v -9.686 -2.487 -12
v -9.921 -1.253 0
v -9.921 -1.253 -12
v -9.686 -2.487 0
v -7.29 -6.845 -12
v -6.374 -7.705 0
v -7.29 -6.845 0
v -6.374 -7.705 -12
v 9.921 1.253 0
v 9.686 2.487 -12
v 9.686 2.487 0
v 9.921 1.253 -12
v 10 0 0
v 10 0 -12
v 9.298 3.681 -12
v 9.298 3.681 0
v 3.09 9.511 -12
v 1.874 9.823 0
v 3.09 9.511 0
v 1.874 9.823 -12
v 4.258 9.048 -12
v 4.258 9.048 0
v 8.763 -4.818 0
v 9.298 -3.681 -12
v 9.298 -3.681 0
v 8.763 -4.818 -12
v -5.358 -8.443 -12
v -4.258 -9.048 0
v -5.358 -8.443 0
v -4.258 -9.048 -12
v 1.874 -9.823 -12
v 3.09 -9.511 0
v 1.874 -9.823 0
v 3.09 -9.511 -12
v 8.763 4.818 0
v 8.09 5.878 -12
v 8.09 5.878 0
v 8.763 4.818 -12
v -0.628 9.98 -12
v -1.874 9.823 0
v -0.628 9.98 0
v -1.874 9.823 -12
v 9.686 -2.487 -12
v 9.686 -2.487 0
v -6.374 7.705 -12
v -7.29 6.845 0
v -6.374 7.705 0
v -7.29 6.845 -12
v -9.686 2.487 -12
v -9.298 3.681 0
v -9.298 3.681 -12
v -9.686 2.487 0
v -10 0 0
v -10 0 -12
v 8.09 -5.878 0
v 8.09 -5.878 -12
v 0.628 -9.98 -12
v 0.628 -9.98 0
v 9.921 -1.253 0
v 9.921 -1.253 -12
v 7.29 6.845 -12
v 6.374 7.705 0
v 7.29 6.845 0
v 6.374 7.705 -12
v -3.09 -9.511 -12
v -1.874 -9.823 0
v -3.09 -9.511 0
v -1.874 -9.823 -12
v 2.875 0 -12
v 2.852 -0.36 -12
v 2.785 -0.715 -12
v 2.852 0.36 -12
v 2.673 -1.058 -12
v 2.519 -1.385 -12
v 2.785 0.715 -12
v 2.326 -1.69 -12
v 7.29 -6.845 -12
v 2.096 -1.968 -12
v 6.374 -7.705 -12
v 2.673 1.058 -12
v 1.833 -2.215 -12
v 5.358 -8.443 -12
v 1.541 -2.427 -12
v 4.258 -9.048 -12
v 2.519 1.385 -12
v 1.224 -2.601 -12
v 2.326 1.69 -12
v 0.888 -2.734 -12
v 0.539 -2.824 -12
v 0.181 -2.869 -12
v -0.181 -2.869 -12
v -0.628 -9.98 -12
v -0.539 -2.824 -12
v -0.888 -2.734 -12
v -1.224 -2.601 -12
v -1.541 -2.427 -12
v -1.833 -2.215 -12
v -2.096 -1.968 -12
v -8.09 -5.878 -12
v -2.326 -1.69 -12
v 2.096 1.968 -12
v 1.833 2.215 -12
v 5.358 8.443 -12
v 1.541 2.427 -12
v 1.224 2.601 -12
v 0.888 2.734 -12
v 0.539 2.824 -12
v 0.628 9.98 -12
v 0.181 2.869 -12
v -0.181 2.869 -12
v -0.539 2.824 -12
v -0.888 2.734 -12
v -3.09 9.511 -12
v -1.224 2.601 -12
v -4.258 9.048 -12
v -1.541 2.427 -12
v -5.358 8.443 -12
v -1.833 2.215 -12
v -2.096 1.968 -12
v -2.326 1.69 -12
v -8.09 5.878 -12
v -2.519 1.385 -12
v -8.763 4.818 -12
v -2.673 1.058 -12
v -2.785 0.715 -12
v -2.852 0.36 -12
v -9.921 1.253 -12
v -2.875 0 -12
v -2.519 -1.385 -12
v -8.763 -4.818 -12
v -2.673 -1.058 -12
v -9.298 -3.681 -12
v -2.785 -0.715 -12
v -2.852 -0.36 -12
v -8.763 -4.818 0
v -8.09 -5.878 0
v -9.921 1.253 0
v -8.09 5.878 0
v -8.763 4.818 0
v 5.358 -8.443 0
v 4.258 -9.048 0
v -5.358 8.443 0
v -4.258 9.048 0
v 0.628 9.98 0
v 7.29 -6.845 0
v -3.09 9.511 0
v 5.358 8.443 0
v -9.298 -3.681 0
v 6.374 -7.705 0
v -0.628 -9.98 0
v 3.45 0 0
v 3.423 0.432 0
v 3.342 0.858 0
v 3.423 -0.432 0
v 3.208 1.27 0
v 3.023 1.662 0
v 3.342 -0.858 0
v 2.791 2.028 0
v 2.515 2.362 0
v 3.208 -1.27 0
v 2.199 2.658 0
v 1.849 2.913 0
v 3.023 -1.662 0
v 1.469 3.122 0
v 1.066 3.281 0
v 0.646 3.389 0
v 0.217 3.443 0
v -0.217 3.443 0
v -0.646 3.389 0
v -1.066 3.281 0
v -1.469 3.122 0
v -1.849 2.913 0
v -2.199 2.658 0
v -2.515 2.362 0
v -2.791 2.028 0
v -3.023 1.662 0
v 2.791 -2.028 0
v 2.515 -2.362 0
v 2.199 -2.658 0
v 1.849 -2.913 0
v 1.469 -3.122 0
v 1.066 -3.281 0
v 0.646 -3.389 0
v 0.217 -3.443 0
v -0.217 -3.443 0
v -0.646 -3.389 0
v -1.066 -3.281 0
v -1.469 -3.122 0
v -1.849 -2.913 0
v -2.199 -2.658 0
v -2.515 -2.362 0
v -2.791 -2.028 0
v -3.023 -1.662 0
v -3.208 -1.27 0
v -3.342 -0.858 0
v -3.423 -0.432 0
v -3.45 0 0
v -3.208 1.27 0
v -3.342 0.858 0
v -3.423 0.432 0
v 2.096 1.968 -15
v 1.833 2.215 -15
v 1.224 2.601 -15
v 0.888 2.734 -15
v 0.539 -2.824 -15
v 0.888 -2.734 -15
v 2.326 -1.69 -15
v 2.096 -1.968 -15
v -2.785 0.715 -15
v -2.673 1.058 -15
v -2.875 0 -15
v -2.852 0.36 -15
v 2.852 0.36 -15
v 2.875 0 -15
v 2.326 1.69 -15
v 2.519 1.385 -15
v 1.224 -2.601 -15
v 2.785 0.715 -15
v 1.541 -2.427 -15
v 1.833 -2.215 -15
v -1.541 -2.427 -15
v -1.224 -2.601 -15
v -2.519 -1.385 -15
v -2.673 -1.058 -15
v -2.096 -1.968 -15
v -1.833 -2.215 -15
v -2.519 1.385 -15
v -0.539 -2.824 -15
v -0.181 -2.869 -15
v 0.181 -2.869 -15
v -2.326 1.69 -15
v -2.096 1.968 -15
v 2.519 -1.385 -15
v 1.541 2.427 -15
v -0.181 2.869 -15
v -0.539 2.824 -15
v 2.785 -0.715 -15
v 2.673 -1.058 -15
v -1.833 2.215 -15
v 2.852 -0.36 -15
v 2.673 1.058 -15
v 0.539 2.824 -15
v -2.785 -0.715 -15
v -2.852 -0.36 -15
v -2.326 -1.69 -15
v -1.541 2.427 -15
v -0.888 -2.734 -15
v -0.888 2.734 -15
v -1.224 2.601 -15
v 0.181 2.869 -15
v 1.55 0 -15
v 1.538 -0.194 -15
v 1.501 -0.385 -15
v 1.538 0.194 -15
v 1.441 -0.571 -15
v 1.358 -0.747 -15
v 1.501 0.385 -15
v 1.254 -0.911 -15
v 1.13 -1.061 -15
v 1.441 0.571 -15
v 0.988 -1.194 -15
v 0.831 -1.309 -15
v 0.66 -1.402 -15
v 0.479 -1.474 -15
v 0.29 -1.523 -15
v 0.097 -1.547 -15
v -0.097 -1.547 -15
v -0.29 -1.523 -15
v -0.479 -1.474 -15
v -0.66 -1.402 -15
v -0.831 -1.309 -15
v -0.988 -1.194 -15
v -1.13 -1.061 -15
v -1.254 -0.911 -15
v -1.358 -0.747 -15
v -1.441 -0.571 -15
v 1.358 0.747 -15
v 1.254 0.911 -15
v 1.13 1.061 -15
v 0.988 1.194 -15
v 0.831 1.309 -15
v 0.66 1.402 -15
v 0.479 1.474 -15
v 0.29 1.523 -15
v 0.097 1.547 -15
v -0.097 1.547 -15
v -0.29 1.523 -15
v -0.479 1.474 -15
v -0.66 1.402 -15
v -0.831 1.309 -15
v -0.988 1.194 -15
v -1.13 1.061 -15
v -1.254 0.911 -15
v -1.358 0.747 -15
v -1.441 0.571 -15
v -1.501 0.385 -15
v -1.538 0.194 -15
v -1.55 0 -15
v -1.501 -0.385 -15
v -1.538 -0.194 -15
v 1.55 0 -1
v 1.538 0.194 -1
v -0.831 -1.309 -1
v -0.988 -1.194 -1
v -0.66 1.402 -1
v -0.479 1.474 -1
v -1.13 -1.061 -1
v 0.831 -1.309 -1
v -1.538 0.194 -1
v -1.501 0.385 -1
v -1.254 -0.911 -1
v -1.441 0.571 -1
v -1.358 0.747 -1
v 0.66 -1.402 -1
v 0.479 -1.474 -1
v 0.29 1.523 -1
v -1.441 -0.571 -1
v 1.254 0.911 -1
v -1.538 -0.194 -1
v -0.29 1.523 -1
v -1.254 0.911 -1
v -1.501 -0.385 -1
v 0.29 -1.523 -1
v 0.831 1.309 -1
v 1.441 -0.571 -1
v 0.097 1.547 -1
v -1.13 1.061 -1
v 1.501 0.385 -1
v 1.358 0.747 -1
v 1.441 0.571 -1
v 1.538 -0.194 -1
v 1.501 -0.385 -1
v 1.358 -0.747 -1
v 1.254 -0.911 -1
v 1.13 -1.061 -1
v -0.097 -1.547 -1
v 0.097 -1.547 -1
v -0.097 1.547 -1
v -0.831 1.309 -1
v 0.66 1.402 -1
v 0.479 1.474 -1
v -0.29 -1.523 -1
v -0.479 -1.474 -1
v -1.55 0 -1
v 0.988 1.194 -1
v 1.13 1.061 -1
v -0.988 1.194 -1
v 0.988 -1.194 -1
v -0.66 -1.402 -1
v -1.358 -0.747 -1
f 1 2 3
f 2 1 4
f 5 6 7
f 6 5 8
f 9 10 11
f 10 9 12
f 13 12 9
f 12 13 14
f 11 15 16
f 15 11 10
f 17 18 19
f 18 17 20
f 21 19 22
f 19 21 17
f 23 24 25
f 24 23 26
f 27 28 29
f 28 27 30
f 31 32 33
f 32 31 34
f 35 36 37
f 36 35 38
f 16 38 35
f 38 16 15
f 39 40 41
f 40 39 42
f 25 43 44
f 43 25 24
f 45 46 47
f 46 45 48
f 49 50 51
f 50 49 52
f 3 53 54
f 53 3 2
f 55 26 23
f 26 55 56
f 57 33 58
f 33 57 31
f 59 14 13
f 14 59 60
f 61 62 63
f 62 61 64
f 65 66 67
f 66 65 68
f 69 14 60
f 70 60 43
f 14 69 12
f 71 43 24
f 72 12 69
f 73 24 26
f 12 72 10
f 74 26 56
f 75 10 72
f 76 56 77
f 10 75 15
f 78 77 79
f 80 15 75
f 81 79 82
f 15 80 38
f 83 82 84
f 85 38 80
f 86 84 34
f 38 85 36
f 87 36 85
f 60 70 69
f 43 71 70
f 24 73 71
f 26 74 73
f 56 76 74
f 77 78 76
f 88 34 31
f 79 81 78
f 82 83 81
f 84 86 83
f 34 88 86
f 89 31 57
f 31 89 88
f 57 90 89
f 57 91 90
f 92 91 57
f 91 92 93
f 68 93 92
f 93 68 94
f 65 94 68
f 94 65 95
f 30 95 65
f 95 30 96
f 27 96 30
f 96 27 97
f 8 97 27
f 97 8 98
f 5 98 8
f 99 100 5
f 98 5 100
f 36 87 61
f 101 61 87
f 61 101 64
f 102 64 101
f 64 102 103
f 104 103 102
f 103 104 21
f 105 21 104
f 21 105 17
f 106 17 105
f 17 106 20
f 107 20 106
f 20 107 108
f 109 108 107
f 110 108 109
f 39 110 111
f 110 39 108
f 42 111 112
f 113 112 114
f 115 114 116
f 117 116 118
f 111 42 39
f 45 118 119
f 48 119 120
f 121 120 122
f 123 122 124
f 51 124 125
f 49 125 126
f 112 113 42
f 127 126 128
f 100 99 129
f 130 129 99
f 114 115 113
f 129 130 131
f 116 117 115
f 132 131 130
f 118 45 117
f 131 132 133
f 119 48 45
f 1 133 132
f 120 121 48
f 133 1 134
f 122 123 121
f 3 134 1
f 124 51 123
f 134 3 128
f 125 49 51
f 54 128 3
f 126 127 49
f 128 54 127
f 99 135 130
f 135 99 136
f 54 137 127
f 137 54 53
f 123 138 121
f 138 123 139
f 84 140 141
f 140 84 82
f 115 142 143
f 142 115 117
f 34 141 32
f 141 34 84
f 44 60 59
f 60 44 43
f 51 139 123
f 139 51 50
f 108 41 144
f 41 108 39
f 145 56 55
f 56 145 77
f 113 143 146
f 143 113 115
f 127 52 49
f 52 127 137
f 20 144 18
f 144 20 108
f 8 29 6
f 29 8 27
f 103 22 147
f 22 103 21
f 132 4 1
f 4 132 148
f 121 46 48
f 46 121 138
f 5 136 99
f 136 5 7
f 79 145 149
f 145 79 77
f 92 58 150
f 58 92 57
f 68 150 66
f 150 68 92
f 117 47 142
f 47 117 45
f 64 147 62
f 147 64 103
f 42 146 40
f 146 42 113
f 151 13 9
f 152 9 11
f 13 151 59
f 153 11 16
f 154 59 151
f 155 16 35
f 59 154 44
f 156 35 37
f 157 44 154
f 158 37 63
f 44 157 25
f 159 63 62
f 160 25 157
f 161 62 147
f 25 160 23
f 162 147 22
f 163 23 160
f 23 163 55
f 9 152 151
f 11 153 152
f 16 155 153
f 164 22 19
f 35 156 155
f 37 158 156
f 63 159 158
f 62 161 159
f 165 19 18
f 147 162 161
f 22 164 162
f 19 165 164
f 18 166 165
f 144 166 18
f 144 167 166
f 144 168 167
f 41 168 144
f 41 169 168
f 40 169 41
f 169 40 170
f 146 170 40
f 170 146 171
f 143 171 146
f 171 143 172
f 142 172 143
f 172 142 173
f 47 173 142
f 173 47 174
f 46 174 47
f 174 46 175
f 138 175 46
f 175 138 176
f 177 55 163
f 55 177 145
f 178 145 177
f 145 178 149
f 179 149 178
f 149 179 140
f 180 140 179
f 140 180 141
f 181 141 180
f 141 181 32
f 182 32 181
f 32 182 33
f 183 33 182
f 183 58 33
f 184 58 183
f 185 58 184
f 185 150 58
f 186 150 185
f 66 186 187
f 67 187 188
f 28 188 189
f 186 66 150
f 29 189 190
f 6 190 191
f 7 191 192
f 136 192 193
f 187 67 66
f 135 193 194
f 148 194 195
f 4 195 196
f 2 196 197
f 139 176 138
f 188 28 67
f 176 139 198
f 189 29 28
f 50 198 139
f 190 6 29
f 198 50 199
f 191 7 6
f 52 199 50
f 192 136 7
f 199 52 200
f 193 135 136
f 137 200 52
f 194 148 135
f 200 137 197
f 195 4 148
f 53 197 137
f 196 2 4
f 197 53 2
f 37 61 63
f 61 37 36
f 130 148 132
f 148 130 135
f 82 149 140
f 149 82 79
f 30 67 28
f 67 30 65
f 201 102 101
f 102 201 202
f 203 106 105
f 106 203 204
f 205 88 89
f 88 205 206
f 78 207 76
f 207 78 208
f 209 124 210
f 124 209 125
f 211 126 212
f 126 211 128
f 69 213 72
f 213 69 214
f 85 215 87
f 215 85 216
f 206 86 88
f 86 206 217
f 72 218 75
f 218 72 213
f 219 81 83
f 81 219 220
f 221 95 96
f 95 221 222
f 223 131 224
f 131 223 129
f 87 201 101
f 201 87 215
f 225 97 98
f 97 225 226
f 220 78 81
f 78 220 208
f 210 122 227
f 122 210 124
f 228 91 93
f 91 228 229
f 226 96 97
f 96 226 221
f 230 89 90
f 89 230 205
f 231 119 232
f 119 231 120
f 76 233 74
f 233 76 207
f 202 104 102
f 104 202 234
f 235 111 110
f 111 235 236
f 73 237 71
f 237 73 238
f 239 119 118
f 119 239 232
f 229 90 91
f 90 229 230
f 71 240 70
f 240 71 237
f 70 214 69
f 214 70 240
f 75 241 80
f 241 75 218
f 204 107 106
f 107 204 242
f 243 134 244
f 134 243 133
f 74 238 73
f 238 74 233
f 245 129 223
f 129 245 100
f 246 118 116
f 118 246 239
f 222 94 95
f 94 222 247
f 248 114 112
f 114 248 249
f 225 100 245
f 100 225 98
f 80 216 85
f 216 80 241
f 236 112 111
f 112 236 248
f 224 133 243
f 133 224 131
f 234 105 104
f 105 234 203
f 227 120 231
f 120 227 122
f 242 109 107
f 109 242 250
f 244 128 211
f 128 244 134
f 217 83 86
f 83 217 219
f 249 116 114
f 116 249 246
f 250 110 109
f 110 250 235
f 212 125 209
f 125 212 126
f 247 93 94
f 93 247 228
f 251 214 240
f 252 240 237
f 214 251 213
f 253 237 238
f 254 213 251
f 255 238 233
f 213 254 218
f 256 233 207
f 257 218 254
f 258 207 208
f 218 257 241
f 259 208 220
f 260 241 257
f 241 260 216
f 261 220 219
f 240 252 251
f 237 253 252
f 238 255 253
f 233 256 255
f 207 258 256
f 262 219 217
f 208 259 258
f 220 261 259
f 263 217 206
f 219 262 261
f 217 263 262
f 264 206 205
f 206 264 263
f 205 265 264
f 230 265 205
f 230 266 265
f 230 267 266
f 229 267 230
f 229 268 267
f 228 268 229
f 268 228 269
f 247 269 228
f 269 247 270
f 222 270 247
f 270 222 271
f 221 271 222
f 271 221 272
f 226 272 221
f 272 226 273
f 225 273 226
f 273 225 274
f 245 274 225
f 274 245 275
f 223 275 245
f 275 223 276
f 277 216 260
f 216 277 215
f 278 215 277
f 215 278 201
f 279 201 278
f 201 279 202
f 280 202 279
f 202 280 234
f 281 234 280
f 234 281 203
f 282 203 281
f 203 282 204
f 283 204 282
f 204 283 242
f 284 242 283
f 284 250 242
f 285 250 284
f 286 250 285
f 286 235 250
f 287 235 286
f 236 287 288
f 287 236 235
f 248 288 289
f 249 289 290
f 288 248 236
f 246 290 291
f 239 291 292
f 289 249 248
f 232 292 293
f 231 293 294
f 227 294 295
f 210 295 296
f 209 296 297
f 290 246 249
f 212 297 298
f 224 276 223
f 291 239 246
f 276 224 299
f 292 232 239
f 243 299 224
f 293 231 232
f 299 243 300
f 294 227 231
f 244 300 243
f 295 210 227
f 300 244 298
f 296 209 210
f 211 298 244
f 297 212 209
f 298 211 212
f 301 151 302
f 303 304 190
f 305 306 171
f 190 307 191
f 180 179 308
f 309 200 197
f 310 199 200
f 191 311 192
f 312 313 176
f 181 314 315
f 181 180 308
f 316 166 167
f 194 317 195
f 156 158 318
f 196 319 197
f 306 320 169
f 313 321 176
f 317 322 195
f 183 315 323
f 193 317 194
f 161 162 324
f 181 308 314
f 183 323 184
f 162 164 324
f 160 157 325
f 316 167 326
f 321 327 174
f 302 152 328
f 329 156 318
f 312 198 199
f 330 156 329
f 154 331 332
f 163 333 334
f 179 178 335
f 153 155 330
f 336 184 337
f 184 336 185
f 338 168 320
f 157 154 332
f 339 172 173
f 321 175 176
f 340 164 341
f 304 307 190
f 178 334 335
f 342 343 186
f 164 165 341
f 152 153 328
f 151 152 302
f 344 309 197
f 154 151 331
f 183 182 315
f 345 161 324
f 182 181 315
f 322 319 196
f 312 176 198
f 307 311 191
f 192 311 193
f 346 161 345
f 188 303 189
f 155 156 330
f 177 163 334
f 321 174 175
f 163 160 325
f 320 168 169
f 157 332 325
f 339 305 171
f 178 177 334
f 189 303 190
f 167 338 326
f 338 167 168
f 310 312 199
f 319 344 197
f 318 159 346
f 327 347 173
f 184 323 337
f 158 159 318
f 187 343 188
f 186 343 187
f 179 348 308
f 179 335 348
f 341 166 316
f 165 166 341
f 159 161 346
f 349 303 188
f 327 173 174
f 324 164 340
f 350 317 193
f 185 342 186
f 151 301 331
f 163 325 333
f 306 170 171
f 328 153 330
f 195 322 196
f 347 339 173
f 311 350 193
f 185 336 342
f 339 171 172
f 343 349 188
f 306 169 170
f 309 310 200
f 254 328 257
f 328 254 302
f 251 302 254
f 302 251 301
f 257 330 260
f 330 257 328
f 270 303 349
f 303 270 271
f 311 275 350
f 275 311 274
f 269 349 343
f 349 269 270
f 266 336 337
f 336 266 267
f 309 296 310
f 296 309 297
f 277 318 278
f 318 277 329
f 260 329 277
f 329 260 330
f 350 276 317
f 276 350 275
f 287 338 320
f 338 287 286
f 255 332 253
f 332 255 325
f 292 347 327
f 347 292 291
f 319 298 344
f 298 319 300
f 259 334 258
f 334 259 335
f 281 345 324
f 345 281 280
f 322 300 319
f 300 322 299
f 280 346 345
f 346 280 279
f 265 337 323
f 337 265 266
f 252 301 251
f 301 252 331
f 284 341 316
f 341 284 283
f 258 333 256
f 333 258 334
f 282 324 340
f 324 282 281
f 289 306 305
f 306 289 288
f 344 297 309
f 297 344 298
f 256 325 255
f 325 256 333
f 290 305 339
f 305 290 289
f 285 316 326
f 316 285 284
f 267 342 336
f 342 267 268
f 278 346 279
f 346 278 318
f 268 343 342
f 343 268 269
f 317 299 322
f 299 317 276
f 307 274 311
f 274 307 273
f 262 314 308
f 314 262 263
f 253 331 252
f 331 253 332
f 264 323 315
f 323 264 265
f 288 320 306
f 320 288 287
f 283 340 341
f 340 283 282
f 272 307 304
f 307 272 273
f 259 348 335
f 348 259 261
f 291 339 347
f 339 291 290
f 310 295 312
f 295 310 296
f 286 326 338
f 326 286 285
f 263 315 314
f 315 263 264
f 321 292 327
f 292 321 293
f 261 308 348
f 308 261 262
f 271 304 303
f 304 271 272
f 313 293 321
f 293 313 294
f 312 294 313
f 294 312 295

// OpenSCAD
$fn = 50;


difference() {
	union() {
		translate(v = [0, 0, -12.0000000000]) {
			cylinder(h = 12, r = 10.0000000000);
		}
		#translate(v = [0, 0, -15.0000000000]) {
			cylinder(h = 15, r = 2.8750000000);
		}
	}
	union() {
		translate(v = [0, 0, 0]) {
			rotate(a = [0, 0, 0]) {
				difference() {
					union() {
						translate(v = [0, 0, -15.0000000000]) {
							cylinder(h = 15, r = 1.2500000000);
						}
						translate(v = [0, 0, -1.0000000000]) {
							cylinder(h = 1.0000000000, r1 = 1.5500000000, r2 = 3.4500000000);
						}
						translate(v = [0, 0, -15.0000000000]) {
							cylinder(h = 15, r = 1.5500000000);
						}
						translate(v = [0, 0, -15.0000000000]) {
							cylinder(h = 15, r = 1.2500000000);
						}
					}
					union();
				}
			}
		}
	}
}
